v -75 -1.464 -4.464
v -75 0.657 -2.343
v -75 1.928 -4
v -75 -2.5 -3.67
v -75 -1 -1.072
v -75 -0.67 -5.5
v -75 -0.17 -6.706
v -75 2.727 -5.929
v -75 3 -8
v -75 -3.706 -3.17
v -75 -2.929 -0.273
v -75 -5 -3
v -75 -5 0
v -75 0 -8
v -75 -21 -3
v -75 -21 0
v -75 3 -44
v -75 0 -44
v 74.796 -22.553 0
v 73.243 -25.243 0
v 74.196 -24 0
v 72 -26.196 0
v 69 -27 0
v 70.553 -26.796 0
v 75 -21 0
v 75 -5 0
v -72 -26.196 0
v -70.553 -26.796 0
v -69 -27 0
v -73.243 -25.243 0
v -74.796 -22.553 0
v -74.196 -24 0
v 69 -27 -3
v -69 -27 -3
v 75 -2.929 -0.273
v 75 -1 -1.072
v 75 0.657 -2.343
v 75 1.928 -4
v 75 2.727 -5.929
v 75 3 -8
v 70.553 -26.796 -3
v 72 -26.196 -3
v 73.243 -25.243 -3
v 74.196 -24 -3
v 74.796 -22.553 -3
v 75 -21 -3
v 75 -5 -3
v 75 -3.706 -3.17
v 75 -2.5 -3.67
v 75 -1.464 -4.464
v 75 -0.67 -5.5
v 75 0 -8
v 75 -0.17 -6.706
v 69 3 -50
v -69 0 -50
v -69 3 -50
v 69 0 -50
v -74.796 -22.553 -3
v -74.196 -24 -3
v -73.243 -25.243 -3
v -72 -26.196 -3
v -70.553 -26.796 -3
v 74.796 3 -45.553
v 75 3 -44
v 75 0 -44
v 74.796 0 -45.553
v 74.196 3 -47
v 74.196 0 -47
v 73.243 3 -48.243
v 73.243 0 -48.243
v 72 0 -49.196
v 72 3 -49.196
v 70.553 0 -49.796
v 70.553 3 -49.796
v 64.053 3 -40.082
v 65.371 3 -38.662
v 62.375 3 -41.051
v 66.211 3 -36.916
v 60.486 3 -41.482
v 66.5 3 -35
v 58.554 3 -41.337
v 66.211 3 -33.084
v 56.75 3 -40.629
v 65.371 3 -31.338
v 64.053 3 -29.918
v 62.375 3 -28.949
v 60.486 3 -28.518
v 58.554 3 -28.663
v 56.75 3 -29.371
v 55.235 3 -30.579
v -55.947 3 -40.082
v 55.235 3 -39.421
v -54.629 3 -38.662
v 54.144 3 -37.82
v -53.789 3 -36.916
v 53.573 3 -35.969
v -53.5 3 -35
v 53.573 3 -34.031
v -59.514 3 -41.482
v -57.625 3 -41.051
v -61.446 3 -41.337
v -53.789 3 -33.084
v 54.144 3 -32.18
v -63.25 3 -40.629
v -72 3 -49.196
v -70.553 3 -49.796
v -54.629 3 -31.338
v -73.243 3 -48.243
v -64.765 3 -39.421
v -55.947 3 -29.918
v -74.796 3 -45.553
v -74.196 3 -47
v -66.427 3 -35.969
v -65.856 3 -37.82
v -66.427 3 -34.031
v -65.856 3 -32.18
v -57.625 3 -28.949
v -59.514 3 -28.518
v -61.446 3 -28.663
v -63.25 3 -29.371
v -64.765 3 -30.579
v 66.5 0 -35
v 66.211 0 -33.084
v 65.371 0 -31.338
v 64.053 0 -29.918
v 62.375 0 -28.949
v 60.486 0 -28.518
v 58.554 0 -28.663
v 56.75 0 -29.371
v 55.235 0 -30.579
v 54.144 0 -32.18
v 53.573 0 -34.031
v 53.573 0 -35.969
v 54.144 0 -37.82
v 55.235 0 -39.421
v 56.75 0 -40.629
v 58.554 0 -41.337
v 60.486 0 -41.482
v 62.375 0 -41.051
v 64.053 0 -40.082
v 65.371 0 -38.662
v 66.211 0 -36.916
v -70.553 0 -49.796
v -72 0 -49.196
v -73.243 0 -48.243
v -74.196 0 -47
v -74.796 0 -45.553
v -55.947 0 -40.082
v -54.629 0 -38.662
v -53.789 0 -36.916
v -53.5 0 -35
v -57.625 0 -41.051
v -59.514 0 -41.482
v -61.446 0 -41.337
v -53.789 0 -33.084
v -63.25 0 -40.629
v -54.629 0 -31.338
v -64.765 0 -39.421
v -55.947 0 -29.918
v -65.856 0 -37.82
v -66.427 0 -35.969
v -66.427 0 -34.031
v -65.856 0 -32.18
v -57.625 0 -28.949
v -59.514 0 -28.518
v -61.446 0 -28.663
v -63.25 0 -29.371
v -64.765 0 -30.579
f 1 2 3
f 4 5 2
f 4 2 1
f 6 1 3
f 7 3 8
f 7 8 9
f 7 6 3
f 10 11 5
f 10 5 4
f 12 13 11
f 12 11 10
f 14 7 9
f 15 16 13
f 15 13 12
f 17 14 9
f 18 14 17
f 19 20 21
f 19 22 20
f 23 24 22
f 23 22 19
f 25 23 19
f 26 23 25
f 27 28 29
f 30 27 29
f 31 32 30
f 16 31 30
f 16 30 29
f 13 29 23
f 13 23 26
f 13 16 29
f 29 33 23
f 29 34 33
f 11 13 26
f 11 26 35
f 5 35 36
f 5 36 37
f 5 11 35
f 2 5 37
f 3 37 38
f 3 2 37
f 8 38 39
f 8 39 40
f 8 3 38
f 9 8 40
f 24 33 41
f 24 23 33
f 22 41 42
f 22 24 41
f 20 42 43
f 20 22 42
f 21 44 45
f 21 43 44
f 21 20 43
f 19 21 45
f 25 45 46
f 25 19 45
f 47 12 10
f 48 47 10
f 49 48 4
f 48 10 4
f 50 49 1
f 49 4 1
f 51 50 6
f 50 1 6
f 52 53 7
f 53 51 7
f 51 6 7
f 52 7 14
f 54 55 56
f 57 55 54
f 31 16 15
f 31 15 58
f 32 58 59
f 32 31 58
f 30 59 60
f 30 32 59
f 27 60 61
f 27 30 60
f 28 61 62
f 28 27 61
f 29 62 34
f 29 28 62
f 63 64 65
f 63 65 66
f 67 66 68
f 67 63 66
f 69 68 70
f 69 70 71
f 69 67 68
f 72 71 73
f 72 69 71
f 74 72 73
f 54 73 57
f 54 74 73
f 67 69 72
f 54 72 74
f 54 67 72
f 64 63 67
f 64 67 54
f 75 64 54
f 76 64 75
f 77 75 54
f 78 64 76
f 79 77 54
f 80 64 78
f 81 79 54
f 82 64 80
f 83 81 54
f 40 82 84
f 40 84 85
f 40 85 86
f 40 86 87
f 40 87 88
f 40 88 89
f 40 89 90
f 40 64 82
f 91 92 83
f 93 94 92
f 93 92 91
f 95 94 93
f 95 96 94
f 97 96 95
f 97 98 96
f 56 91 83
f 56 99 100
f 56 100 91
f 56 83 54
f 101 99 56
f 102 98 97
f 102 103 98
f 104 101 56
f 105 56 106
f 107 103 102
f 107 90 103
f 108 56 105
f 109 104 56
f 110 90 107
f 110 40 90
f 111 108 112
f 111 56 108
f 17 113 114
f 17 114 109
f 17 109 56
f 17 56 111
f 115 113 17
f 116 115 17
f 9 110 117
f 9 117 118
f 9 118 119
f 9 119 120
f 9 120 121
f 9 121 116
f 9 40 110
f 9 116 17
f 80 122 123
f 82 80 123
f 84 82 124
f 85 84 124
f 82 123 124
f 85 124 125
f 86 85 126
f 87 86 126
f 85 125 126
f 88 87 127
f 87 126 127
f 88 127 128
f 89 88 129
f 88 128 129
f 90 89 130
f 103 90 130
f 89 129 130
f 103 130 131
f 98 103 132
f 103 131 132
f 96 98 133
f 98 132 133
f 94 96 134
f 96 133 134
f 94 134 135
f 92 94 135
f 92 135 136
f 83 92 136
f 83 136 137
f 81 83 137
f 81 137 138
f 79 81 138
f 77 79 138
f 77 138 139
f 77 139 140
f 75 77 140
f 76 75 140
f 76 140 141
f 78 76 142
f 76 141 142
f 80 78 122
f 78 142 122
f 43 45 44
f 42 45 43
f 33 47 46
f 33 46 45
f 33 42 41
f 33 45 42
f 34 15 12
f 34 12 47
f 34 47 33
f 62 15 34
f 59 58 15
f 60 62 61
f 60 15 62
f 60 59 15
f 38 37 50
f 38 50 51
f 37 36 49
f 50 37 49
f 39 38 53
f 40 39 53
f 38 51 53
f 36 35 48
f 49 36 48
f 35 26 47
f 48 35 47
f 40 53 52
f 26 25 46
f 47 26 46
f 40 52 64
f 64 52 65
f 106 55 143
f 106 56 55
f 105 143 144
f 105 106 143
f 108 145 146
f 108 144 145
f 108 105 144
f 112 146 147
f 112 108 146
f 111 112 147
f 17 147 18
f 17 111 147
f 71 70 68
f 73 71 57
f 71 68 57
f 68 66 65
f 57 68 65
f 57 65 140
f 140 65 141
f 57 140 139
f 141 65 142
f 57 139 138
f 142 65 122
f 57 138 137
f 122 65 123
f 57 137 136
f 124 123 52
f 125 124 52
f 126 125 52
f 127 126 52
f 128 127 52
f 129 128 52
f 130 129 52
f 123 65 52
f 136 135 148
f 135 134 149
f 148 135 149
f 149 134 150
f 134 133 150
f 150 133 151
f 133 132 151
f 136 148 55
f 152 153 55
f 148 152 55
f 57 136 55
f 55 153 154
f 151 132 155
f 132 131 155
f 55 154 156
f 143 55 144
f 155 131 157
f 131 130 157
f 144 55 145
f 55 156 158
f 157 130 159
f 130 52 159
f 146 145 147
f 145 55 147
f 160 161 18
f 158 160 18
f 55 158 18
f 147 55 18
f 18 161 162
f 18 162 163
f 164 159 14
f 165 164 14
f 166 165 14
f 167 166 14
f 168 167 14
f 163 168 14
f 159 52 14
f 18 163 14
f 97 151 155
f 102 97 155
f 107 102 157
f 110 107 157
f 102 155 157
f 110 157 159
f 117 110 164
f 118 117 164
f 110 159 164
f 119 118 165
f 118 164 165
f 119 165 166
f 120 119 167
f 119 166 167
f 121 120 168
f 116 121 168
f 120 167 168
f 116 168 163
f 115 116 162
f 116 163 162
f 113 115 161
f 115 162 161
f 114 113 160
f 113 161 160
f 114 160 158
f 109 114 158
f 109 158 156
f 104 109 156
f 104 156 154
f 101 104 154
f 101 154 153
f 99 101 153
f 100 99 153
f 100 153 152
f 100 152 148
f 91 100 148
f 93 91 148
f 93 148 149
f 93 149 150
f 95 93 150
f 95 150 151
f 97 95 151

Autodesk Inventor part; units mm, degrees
ref_plane "YZ Plane" through (0, 0, 0) normal (1, 0, 0) x (0, 1, 0)
ref_plane "XZ Plane" through (0, 0, 0) normal (0, 1, 0) x (-1, 0, 0)
ref_plane "XY Plane" through (0, 0, 0) normal (0, 0, 1) x (1, 0, 0)
sketch "Sketch4" plane through (0, 0, 0) normal (0, 1, 0) x (-1, 0, 0)
  line L0 (75, -50) -> (-75, -50)
  line L1 (-75, -50) -> (-75, 0)
  line L2 (-75, 0) -> (75, 0)
  line L3 (75, 0) -> (75, -50)
  point P0 (0, 0)
  point P1 (0, 0)
  dimension "d36" = 150
  dimension "d37" = 50
extrude "Plate2" add sketch "Sketch4" along normal blind 3
sketch "Sketch5" plane through (0, 0, 0) normal (0, -1, 0) x (1, 0, 0)
  circle A0 centre (-60, -35) radius 6.5
  circle A1 centre (60, -35) radius 6.5
  line L0 (0, 0) -> (0, -50) construction
  line L1 (75, -50) -> (-75, -50) construction
  dimension "d39" = 120
  dimension "d40" = 15
  dimension "d41" = 13
extrude "Cut1" cut sketch "Sketch5" against normal blind 3
sketch "Sketch6" plane through (-75, 3, -3) normal (0, 0, 1) x (1, 0, 0)
  line L0 (150, 0) -> (0, 0)
  line L1 (0, 0) -> (0, -30)
  line L2 (0, -30) -> (150, -30)
  line L3 (150, -30) -> (150, 0)
edge flange "Flange1" height 30 angle 90 thickness 3 bend radius 5 thickness toward (0, 0, 1) relief round relief width 3 relief depth 1.5 edges at (0, 0, 0) wall of the first edge with corners at (75, 3, -3) (-75, 3, -3) (-75, -27, -3) (75, -27, -3)
bend "Bend1"
corner "Corner1"
fillet "Corner Round6" radius 6 4 edges at (75, -27, -1.5) (-75, 1.5, -50) (75, 1.5, -50) (-75, -27, -1.5)
equation "\"d42\" = Thickness"
equation "\"d38\" = Thickness"
equation "\"d44\" = BendReliefWidth"
equation "\"d45\" = BendReliefDepth"
equation "\"d46\" = MinimumRemnant"
equation "\"d47\" = TransitionRadius"
equation "\"d50\" = BendRadius"
equation "\"d51\" = CornerReliefSize"
equation "\"d52\" = GapSize"
equation "\"d53\" = JacobiRadiusSize"
equation "\"BendReliefWidth\" = Thickness"
equation "\"BendReliefDepth\" = 0.5 * Thickness"
equation "\"CornerReliefSize\" = 4 * Thickness"
equation "\"MinimumRemnant\" = 2 * Thickness"
equation "\"TransitionRadius\" = BendRadius"
equation "\"JacobiRadiusSize\" = BendRadius"
equation "\"GapSize\" = Thickness"
equation "\"Thickness\" = 3"
equation "\"BendRadius\" = 5"
properties part number "NDM-VOS 712 flange" material "Stainless Steel"
